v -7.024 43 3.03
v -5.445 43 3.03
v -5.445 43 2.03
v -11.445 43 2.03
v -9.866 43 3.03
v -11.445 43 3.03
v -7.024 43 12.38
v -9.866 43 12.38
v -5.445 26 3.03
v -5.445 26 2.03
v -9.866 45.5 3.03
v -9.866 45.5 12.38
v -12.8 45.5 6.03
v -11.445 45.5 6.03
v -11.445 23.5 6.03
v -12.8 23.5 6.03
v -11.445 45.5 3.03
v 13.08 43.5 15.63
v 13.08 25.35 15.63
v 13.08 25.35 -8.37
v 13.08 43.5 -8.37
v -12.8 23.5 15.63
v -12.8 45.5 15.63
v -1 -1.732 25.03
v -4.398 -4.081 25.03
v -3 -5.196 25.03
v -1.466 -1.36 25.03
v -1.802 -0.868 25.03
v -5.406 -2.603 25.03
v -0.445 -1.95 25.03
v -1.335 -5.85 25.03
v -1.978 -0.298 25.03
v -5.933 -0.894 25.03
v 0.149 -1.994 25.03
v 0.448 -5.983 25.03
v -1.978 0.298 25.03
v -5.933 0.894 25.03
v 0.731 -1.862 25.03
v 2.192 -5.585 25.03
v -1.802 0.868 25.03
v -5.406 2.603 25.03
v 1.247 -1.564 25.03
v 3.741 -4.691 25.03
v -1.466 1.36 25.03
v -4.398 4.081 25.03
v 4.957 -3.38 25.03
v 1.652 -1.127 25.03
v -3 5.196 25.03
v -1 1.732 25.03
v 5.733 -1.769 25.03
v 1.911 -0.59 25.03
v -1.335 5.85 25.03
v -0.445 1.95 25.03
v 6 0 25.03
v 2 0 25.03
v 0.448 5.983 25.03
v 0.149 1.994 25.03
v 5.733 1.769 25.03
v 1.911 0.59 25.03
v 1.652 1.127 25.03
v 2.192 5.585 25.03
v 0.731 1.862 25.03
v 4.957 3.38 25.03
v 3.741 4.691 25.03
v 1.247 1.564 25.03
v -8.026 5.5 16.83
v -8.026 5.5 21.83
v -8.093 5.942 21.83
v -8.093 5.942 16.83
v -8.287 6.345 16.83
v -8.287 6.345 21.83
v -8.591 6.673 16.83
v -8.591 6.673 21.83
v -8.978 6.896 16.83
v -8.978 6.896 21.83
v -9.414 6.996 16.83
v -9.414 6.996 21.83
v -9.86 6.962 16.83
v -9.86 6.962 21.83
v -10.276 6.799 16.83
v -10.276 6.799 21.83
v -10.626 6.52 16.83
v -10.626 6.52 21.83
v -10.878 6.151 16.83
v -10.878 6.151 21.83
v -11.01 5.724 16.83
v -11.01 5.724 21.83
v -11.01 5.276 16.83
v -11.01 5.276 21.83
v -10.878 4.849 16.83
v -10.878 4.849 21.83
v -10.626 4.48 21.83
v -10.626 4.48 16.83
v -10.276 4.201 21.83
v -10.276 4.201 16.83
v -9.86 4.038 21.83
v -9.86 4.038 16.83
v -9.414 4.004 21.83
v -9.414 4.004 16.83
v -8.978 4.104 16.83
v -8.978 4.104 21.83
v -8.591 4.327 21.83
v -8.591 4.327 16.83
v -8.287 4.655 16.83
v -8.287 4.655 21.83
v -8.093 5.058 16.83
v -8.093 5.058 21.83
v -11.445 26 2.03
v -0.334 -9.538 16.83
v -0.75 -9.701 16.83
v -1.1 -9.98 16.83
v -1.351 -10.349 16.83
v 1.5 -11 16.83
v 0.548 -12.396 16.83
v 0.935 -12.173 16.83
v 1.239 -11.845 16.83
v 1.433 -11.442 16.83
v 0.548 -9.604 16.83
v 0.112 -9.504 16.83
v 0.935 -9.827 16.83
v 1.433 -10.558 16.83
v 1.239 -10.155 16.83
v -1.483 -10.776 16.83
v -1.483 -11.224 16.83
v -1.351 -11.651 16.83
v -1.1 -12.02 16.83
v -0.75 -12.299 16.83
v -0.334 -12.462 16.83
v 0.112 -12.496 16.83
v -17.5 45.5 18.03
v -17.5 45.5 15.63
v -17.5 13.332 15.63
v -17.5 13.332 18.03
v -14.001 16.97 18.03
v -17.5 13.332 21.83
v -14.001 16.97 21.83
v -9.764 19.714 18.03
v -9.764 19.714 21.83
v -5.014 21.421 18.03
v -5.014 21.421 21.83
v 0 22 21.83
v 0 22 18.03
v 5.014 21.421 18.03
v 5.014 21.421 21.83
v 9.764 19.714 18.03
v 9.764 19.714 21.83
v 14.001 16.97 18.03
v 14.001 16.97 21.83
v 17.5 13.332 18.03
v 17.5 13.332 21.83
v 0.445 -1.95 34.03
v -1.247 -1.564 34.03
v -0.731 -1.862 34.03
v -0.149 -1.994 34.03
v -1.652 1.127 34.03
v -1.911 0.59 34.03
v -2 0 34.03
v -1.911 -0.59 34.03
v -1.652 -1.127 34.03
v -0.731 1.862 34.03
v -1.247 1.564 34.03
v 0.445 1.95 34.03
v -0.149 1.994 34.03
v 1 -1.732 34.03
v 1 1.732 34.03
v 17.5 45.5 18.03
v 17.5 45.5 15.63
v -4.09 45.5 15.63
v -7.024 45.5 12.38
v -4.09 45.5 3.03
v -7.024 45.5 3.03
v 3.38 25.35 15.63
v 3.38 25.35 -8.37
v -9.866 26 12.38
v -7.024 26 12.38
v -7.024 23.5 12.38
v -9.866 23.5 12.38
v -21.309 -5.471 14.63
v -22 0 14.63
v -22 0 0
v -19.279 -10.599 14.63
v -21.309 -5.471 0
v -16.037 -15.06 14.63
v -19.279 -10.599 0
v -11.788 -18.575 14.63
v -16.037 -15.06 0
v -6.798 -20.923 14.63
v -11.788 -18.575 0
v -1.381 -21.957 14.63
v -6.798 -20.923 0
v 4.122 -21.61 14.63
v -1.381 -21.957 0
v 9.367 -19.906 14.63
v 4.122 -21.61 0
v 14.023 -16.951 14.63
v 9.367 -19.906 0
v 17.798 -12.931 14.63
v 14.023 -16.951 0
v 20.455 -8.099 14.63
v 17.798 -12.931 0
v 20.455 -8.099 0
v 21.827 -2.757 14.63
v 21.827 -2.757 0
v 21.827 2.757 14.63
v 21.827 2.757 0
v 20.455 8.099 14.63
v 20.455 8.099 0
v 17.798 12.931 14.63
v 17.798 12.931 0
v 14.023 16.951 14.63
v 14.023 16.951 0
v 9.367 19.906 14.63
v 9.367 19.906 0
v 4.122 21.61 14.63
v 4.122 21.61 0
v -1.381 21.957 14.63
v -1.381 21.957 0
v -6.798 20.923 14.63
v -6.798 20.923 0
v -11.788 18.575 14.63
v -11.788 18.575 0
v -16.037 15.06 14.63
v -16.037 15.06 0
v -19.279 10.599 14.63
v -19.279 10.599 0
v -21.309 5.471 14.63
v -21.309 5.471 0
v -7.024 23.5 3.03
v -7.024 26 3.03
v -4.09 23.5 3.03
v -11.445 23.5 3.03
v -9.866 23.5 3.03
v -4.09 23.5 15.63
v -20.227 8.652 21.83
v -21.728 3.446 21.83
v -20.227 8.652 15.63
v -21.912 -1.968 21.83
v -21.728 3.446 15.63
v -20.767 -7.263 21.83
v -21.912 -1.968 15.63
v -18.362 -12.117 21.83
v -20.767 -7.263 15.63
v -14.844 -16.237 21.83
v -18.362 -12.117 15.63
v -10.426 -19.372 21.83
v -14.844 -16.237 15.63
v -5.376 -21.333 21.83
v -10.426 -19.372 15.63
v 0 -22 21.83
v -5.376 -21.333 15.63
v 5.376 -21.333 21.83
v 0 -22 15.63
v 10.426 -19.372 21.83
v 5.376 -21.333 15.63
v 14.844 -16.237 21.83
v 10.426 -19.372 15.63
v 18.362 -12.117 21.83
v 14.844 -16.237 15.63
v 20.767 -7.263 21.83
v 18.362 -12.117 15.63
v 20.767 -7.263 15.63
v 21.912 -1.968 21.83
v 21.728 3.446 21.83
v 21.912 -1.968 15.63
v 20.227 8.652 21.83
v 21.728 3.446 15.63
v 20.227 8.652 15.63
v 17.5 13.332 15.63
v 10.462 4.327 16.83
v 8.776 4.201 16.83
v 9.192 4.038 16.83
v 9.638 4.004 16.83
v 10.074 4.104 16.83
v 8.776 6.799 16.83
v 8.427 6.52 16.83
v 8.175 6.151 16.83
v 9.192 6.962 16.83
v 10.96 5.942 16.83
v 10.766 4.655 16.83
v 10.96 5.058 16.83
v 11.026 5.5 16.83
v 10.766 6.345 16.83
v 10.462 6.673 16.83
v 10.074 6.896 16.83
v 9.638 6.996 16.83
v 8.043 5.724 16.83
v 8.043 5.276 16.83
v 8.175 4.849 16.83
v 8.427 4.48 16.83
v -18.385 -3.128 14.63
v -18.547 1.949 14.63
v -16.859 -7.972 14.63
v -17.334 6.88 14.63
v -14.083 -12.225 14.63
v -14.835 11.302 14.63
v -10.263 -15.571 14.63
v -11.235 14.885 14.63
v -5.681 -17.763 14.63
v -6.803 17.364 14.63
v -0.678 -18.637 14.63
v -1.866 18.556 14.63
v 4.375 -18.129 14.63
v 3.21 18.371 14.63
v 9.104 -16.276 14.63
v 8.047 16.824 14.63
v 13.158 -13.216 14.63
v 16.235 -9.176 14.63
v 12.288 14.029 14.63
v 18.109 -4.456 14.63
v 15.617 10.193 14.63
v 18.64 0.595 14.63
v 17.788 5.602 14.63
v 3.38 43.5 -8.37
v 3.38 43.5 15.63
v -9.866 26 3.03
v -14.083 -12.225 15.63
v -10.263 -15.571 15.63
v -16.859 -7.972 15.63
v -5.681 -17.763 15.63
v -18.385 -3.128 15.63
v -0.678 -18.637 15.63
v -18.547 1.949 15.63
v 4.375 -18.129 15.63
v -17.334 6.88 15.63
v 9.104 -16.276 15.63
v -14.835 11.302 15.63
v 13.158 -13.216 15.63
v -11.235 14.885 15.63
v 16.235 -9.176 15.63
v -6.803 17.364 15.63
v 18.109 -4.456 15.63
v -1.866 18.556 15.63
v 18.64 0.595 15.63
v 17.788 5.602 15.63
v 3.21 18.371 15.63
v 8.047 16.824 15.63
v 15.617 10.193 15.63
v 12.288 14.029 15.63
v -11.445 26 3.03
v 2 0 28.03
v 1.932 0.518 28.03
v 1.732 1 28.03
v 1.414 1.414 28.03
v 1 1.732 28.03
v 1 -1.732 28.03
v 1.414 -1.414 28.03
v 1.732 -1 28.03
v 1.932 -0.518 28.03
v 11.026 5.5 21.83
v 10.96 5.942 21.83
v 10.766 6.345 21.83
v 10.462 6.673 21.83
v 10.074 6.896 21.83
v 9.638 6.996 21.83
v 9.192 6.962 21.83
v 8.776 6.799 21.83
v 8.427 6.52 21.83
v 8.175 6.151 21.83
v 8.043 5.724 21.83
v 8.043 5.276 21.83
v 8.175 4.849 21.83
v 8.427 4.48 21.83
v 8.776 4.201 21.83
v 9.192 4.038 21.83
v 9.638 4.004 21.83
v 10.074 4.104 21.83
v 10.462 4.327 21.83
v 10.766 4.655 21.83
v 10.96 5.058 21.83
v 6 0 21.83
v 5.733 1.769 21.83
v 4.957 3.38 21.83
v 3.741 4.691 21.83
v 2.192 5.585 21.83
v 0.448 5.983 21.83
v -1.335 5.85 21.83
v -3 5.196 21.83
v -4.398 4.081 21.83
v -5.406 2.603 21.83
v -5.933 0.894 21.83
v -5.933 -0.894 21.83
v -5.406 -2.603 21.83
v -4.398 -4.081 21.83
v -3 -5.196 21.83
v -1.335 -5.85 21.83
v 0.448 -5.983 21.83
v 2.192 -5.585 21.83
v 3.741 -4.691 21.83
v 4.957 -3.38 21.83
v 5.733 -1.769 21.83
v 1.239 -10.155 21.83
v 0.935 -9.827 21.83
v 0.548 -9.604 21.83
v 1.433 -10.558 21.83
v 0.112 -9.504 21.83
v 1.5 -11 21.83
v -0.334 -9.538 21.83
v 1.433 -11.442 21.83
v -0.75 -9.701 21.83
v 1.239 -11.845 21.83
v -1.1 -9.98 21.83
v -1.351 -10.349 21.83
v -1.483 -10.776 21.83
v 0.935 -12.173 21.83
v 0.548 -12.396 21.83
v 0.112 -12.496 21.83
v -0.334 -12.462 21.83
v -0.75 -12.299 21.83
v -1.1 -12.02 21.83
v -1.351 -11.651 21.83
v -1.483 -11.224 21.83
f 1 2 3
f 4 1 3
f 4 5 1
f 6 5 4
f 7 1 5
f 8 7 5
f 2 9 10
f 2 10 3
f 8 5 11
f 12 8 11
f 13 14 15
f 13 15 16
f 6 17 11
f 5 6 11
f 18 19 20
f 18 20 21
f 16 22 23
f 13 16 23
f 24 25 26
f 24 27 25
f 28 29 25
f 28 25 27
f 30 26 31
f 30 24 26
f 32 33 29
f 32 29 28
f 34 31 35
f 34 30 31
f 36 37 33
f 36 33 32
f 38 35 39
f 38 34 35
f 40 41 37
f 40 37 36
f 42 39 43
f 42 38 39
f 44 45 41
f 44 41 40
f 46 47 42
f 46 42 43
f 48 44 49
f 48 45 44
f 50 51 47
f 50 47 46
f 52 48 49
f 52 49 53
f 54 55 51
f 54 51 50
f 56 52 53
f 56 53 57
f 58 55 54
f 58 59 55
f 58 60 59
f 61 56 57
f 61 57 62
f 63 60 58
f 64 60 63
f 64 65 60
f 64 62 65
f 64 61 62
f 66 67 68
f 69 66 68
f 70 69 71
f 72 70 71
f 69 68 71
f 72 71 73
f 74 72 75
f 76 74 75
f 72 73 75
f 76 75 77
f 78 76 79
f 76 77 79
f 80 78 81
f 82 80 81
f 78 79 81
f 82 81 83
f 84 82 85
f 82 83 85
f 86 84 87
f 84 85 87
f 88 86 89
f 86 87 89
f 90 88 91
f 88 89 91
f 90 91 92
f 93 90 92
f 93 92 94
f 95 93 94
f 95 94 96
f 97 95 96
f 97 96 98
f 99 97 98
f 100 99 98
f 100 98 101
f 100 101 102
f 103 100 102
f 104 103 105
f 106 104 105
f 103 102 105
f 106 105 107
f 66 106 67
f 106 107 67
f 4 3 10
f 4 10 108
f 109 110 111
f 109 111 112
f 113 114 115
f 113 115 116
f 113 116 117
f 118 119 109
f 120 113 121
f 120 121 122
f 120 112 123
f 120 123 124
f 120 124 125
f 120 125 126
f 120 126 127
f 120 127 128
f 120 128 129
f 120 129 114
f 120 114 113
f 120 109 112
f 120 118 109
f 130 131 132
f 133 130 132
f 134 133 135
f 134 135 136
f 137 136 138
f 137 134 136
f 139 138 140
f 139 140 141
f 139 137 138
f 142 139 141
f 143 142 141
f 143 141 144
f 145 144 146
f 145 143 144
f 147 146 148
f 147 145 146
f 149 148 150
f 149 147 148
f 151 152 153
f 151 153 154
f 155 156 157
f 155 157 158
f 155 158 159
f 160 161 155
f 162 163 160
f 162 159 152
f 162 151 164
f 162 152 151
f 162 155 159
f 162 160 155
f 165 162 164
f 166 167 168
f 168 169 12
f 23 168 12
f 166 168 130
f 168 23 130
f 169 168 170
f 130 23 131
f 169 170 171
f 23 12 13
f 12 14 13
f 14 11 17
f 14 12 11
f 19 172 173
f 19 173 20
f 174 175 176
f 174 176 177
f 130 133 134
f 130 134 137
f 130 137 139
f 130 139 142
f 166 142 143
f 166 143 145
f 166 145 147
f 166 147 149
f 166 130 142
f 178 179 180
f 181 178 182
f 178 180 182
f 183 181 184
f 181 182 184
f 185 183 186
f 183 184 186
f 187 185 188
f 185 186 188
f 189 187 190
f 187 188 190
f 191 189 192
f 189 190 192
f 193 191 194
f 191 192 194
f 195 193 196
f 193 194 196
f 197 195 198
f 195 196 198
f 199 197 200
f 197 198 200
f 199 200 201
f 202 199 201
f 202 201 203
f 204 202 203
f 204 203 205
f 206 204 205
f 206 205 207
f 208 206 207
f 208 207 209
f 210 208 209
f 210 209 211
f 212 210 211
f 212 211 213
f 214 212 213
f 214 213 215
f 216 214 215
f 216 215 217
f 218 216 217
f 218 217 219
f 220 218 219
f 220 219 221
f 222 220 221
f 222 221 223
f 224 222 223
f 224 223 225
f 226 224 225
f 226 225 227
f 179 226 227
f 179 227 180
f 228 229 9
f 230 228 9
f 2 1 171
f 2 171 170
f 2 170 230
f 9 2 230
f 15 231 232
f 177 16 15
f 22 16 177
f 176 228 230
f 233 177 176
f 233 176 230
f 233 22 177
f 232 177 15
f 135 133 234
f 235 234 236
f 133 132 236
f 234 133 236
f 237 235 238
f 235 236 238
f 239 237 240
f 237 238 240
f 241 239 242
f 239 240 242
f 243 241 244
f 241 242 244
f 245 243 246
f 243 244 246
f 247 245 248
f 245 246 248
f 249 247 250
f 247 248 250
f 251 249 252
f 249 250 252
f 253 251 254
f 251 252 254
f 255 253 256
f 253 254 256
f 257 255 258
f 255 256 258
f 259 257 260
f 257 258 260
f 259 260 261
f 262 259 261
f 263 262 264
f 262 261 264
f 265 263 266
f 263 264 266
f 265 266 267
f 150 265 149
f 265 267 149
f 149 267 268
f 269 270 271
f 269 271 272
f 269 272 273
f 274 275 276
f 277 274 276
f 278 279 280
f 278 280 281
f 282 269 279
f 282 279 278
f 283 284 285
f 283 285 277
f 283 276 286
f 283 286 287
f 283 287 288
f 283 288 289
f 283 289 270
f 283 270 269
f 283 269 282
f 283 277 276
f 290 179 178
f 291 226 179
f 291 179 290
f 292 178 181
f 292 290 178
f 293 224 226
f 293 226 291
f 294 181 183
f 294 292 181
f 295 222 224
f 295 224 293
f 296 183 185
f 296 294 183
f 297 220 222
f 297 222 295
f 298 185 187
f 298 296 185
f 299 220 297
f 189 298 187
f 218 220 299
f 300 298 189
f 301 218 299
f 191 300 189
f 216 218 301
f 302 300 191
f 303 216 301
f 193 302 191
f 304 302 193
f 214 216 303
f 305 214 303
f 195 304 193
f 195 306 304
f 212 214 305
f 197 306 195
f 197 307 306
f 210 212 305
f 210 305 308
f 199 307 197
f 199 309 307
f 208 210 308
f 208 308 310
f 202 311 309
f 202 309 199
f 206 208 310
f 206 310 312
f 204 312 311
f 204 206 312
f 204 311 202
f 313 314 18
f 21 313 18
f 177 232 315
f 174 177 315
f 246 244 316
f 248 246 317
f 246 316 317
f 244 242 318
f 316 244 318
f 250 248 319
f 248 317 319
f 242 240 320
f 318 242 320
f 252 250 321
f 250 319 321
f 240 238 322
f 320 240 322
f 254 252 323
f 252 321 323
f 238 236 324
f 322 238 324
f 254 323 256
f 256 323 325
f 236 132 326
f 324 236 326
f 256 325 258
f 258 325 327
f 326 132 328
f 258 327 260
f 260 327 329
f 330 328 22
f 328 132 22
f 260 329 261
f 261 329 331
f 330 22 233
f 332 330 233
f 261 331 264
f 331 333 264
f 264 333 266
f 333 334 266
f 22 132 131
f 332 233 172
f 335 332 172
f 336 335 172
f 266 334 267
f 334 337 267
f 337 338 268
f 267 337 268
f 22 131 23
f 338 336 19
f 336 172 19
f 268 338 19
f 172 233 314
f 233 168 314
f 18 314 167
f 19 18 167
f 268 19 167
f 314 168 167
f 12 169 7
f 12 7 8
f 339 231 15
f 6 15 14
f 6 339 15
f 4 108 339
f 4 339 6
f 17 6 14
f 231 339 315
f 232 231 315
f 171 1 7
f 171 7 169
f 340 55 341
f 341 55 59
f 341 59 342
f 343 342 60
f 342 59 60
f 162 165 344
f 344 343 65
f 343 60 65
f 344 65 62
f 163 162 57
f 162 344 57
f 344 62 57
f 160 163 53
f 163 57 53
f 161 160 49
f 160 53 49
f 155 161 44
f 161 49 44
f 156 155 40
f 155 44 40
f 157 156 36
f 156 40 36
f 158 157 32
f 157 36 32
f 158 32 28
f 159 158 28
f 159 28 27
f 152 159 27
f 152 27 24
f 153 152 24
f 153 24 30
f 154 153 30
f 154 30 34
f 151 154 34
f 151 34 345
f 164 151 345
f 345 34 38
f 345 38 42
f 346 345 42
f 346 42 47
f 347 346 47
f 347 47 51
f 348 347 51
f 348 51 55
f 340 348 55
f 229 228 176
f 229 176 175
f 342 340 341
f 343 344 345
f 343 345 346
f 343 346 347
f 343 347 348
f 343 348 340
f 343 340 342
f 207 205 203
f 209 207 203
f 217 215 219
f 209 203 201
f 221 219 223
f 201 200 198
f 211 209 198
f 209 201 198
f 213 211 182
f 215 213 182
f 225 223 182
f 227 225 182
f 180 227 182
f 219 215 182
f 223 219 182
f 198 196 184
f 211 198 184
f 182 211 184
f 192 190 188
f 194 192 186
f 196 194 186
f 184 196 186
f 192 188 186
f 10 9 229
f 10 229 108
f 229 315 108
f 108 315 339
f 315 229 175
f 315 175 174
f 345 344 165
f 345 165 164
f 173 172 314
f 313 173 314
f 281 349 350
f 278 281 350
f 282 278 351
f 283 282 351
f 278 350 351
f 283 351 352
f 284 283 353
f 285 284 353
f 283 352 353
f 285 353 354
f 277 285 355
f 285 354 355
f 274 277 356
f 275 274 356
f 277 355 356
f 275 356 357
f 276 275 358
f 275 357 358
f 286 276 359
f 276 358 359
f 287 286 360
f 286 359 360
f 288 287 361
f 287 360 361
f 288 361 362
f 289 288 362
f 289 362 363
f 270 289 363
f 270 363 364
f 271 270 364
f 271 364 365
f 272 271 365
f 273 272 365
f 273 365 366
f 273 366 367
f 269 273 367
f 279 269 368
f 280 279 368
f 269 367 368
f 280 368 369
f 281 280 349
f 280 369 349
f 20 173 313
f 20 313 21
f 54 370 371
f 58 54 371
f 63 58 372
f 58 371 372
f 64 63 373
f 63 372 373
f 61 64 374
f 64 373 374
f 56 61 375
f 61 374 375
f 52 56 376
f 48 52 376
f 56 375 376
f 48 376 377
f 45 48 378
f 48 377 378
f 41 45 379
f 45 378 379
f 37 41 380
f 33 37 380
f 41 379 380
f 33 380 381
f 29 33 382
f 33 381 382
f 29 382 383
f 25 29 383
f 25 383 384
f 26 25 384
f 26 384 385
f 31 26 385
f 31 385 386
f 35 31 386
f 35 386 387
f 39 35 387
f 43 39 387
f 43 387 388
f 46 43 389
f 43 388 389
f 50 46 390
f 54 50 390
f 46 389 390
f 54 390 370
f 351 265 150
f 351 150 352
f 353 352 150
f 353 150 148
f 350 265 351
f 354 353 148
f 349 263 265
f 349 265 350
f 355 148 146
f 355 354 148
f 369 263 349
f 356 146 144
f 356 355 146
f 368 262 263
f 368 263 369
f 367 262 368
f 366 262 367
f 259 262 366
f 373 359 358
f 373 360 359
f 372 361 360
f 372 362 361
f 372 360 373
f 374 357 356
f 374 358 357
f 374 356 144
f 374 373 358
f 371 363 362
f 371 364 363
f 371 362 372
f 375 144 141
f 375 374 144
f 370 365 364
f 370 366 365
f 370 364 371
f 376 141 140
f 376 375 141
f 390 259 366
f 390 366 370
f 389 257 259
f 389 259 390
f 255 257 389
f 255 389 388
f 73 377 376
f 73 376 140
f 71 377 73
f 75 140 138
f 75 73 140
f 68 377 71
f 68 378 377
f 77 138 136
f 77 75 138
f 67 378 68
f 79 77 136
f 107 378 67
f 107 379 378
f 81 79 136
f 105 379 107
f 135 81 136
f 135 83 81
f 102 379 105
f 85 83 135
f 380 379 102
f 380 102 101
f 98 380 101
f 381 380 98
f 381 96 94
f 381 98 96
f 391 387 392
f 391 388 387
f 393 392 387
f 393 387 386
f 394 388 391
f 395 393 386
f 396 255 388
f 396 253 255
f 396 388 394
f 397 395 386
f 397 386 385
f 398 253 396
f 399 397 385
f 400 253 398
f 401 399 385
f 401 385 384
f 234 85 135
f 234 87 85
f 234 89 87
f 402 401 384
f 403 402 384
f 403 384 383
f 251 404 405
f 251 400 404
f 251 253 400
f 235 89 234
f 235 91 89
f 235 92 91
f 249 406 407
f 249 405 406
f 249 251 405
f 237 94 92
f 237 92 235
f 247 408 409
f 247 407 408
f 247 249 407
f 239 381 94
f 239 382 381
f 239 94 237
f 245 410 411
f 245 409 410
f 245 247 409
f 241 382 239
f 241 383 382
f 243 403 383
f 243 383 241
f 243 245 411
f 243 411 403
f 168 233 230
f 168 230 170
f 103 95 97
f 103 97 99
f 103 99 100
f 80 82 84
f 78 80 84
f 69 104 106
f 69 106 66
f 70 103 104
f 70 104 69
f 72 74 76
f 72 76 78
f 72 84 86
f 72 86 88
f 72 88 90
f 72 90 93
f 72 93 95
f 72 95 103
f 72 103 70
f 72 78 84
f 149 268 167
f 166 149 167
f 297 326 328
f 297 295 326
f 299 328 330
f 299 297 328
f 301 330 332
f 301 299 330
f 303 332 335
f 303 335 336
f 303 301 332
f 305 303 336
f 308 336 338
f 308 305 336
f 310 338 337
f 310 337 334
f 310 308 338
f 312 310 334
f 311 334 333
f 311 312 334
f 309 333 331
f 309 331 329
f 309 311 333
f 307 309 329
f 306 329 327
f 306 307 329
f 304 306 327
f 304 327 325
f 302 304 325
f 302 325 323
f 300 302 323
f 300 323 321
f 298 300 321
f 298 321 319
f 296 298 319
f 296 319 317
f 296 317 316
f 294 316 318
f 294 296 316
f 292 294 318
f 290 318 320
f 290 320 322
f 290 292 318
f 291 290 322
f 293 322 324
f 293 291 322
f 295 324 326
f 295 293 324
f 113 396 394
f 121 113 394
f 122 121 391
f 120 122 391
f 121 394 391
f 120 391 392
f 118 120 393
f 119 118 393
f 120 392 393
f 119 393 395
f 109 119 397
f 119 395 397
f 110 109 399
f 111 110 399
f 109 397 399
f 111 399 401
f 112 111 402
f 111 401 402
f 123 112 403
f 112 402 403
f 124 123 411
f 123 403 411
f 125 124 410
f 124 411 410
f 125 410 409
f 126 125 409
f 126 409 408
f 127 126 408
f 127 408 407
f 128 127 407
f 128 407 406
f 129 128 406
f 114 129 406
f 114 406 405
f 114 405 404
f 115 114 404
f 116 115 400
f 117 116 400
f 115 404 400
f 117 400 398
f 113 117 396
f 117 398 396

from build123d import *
from build123d.topology import SkipClean

# Parameters (mm, degrees)
SKETCH1_R           = 22
BOSS_EXTRUDE1_DEPTH = 21.83
SKETCH2_R           = 6
SKETCH2_R_2         = 2
BOSS_EXTRUDE2_DEPTH = 3.2
SKETCH3_R           = 2
BOSS_EXTRUDE3_DEPTH = 12.2
BOSS_EXTRUDE4_START = -6.2
BOSS_EXTRUDE4_DEPTH = 6.2
CUT_EXTRUDE3_START  = -3.8
CUT_EXTRUDE3_DEPTH  = 3.8
SKETCH7_W           = 9.7
SKETCH7_H           = 18.15
BOSS_EXTRUDE5_DEPTH = 26.4
SKETCH7_3_W         = 8.71
SKETCH7_3_H         = 22
BOSS_EXTRUDE6_DEPTH = 15
SKETCH8_R           = 1.5
CUT_EXTRUDE4_DEPTH  = 5
SKETCH9_W           = 1
SKETCH9_H           = 3.350814255
SKETCH10_W          = 6
SKETCH10_H          = 17
BOSS_EXTRUDE7_DEPTH = 1
SKETCH12_W          = 1.355
SKETCH12_H          = 22
CUT_EXTRUDE5_DEPTH  = 3
SKETCH13_W          = 2.841503492
SKETCH13_H          = 2.5
CUT_EXTRUDE6_DEPTH  = 9.35
CUT_EXTRUDE7_START  = -6
CUT_EXTRUDE7_DEPTH  = 6


with BuildPart() as part:
    # Sketch1 → Boss-Extrude1 (new body)
    with BuildSketch(Plane.XY):
        Circle(SKETCH1_R)
    extrude(amount=BOSS_EXTRUDE1_DEPTH)

    # Sketch2 → Boss-Extrude2 (add)
    with BuildSketch(Plane.XY.offset(21.83)):
        Circle(SKETCH2_R)
        Circle(SKETCH2_R_2, mode=Mode.SUBTRACT)
    extrude(amount=BOSS_EXTRUDE2_DEPTH)

    # Sketch3 → Boss-Extrude3 (add)
    with BuildSketch(Plane.XY.offset(21.83)):
        Circle(SKETCH3_R)
    extrude(amount=BOSS_EXTRUDE3_DEPTH)

    # Sketch4 → Boss-Extrude4 (add)
    with BuildSketch(Plane.XY.offset(21.83).offset(BOSS_EXTRUDE4_START)):
        with BuildLine():
            ThreePointArc((-17.5, 13.332291626), (0, 22), (17.5, 13.332291626))
            Line((17.5, 13.332291626), (17.5, 45.5))
            Line((17.5, 45.5), (-17.5, 45.5))
            Line((-17.5, 45.5), (-17.5, 13.332291626))
        make_face()
    extrude(amount=BOSS_EXTRUDE4_DEPTH)

    # Sketch4<4> → Cut-Extrude3 (cut)
    with SkipClean():  # the faces are left unmerged after this step: merging them gives an invalid solid
        with BuildSketch(Plane.XY.offset(21.83).offset(CUT_EXTRUDE3_START)):
            with BuildLine():
                ThreePointArc((-17.5, 13.332291626), (0, 22), (17.5, 13.332291626))
                Line((17.5, 13.332291626), (17.5, 45.5))
                Line((17.5, 45.5), (-17.5, 45.5))
                Line((-17.5, 45.5), (-17.5, 13.332291626))
            make_face()
        extrude(amount=CUT_EXTRUDE3_DEPTH, mode=Mode.SUBTRACT)

    # Sketch7 → Boss-Extrude5 (add)
    with SkipClean():  # the faces are left unmerged after this step: merging them gives an invalid solid
        with BuildSketch(Plane.XY.offset(18.03)):
            with Locations((8.23, 34.425)):
                Rectangle(SKETCH7_W, SKETCH7_H)
        extrude(amount=-BOSS_EXTRUDE5_DEPTH)

    # Sketch7<3> → Boss-Extrude6 (add)
    with SkipClean():  # the faces are left unmerged after this step: merging them gives an invalid solid
        with BuildSketch(Plane.XY.offset(18.03)):
            with Locations((-8.445, 34.5)):
                Rectangle(SKETCH7_3_W, SKETCH7_3_H)
        extrude(amount=-BOSS_EXTRUDE6_DEPTH)

    # Sketch8 → Cut-Extrude4 (cut)
    with SkipClean():  # the faces are left unmerged after this step: merging them gives an invalid solid
        with BuildSketch(Plane.XY.offset(21.83)):
            with Locations((-9.526279442, 5.5)):
                Circle(SKETCH8_R)
            with Locations((9.526279442, 5.5)):
                Circle(SKETCH8_R)
            with Locations((0, -11)):
                Circle(SKETCH8_R)
        extrude(amount=-CUT_EXTRUDE4_DEPTH, mode=Mode.SUBTRACT)

    # Sketch9 → Cut-Revolve1 (revolve, cut)
    with SkipClean():  # the faces are left unmerged after this step: merging them gives an invalid solid
        with BuildSketch(Plane(origin=(0, 0, 0), x_dir=(0, 0, -1), z_dir=(1, 0, 0))):
            with Locations((-15.13, 20.324592872)):
                Rectangle(SKETCH9_W, SKETCH9_H)
        revolve(axis=Axis((0, 0, 34.03), (0, 0, -1)), mode=Mode.SUBTRACT)

    # Sketch10 → Boss-Extrude7 (add)
    with SkipClean():  # the faces are left unmerged after this step: merging them gives an invalid solid
        with BuildSketch(Plane(origin=(0, 0, 3.03), x_dir=(-1, 0, 0), z_dir=(0, 0, -1))):
            with Locations((8.445, 34.5)):
                Rectangle(SKETCH10_W, SKETCH10_H)
        extrude(amount=BOSS_EXTRUDE7_DEPTH)

    # Sketch12 → Cut-Extrude5 (cut)
    with SkipClean():  # the faces are left unmerged after this step: merging them gives an invalid solid
        with BuildSketch(Plane(origin=(0, 0, 3.03), x_dir=(-1, 0, 0), z_dir=(0, 0, -1))):
            with Locations((12.1225, 34.5)):
                Rectangle(SKETCH12_W, SKETCH12_H)
        extrude(amount=-CUT_EXTRUDE5_DEPTH, mode=Mode.SUBTRACT)

    # Sketch13 → Cut-Extrude6 (cut)
    with SkipClean():  # the faces are left unmerged after this step: merging them gives an invalid solid
        with BuildSketch(Plane(origin=(0, 0, 3.03), x_dir=(-1, 0, 0), z_dir=(0, 0, -1))):
            with Locations((8.445, 44.25)):
                Rectangle(SKETCH13_W, SKETCH13_H)
            with Locations((8.445, 24.75)):
                Rectangle(SKETCH13_W, SKETCH13_H)
        extrude(amount=-CUT_EXTRUDE6_DEPTH, mode=Mode.SUBTRACT)

    # Sketch14 → Cut-Extrude7 (cut)
    with SkipClean():  # the faces are left unmerged after this step: merging them gives an invalid solid
        with BuildSketch(Plane.XY.offset(34.03).offset(CUT_EXTRUDE7_START)):
            with BuildLine():
                Line((1, 1.732050808), (1, -1.732050808))
                ThreePointArc((1, -1.732050808), (2, 0), (1, 1.732050808))
            make_face()
        extrude(amount=CUT_EXTRUDE7_DEPTH, mode=Mode.SUBTRACT)


solid = part.part
